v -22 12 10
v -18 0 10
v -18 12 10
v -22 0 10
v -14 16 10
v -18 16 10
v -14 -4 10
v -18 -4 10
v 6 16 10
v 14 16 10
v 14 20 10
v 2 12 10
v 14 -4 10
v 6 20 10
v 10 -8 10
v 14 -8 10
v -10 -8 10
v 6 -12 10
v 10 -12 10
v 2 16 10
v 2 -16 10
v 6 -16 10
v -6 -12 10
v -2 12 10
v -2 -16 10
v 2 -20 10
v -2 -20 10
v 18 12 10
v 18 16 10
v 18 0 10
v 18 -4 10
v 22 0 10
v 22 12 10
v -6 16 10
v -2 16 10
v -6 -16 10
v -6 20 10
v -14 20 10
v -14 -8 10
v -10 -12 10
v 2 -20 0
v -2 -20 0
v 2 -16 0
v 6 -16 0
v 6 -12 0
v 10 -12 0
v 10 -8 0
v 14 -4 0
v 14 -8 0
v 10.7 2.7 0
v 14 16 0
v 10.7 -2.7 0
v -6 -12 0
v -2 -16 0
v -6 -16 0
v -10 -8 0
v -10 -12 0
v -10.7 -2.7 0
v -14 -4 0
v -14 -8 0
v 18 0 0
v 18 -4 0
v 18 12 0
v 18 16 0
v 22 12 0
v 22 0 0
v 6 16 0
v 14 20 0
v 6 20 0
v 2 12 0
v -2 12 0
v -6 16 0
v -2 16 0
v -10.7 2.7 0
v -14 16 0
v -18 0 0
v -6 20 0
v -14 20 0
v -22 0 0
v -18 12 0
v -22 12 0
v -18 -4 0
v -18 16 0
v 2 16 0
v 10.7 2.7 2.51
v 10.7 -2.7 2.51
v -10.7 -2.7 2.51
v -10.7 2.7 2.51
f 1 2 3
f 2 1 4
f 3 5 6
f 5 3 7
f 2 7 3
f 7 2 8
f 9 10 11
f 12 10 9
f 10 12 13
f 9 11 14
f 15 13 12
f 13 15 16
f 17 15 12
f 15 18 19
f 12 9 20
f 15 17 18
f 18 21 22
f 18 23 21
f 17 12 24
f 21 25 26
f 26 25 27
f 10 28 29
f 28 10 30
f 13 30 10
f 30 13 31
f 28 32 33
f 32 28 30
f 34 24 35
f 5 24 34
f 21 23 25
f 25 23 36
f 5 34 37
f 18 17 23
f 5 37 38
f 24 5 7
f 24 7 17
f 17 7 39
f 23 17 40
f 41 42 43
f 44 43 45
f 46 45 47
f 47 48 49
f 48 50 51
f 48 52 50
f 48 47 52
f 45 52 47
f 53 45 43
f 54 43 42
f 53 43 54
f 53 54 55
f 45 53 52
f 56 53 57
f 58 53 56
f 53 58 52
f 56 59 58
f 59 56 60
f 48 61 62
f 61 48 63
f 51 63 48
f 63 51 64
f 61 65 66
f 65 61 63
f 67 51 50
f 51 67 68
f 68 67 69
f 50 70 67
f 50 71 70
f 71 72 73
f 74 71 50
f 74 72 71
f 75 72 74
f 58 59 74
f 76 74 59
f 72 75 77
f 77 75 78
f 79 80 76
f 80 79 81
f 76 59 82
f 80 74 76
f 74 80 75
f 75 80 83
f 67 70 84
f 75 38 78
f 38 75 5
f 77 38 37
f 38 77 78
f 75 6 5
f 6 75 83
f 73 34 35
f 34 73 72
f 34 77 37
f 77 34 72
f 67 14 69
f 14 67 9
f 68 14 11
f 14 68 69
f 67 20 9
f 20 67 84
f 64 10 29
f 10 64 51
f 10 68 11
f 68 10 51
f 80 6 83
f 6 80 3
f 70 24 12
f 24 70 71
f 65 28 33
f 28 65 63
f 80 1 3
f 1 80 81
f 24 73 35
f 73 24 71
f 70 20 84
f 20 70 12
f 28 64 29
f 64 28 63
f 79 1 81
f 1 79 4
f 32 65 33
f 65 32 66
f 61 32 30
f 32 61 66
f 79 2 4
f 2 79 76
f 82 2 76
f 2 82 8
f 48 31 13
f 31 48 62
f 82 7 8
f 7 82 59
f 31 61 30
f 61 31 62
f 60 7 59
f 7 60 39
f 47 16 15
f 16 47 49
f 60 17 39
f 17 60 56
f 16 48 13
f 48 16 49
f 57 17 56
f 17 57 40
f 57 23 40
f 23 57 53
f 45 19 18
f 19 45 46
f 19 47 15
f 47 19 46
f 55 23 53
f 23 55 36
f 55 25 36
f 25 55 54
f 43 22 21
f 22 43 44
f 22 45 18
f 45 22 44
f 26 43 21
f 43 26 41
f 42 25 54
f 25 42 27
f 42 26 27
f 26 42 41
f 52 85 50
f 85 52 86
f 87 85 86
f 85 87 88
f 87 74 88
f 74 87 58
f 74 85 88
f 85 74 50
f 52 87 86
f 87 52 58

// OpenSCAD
// Messagebox heart — 8-bit pixel-art heart, driven by an FS90R servo.
//
// Print orientation: back face DOWN (z=0 on bed), pixels extruding UP in +Z.
// No supports needed. The horn pocket is a cavity that opens toward the bed.

// ======== Parameters ========
pixel_size            = 4;     // was 8; fits 82x50 box front face at 44x40mm
heart_depth           = 10;
horn_pocket_length    = 21;    // along X (horizontal, across heart width)
horn_pocket_width     = 5;     // along Y
horn_pocket_depth     = 2.5;
horn_clearance        = 0.2;
$fn = 64;

// ======== Pixel bitmap ========
// 1 = filled, 0 = empty. Row 0 is the TOP.
bitmap = [
    [0, 0, 1, 1, 0, 0, 0, 1, 1, 0, 0],  // row 0 — two top bumps, central notch
    [0, 1, 1, 1, 1, 0, 1, 1, 1, 1, 0],  // row 1
    [1, 1, 1, 1, 1, 1, 1, 1, 1, 1, 1],  // row 2 — widest
    [1, 1, 1, 1, 1, 1, 1, 1, 1, 1, 1],  // row 3
    [1, 1, 1, 1, 1, 1, 1, 1, 1, 1, 1],  // row 4
    [0, 1, 1, 1, 1, 1, 1, 1, 1, 1, 0],  // row 5
    [0, 0, 1, 1, 1, 1, 1, 1, 1, 0, 0],  // row 6
    [0, 0, 0, 1, 1, 1, 1, 1, 0, 0, 0],  // row 7
    [0, 0, 0, 0, 1, 1, 1, 0, 0, 0, 0],  // row 8
    [0, 0, 0, 0, 0, 1, 0, 0, 0, 0, 0]   // row 9 — single-pixel point
];

rows = len(bitmap);        // 10
cols = len(bitmap[0]);     // 11

// ======== Heart ========
module pixel_heart() {
    difference() {
        // Pixels — centered on origin, extruding in +Z from z=0.
        union() {
            for (r = [0 : rows - 1]) {
                for (c = [0 : cols - 1]) {
                    if (bitmap[r][c] == 1) {
                        x = (c - (cols - 1) / 2) * pixel_size;
                        y = ((rows - 1) / 2 - r) * pixel_size;
                        translate([x - pixel_size/2, y - pixel_size/2, 0])
                            cube([pixel_size, pixel_size, heart_depth]);
                    }
                }
            }
        }

        // Horn pocket cut into the back face, opening toward -Z.
        // Length along X so a dual-arm horn runs left/right across the heart.
        pocket_l = horn_pocket_length + 2 * horn_clearance;
        pocket_w = horn_pocket_width  + 2 * horn_clearance;
        translate([-pocket_l/2, -pocket_w/2, -0.01])
            cube([pocket_l, pocket_w, horn_pocket_depth + 0.02]);
    }
}

// ======== Render ========
pixel_heart();
